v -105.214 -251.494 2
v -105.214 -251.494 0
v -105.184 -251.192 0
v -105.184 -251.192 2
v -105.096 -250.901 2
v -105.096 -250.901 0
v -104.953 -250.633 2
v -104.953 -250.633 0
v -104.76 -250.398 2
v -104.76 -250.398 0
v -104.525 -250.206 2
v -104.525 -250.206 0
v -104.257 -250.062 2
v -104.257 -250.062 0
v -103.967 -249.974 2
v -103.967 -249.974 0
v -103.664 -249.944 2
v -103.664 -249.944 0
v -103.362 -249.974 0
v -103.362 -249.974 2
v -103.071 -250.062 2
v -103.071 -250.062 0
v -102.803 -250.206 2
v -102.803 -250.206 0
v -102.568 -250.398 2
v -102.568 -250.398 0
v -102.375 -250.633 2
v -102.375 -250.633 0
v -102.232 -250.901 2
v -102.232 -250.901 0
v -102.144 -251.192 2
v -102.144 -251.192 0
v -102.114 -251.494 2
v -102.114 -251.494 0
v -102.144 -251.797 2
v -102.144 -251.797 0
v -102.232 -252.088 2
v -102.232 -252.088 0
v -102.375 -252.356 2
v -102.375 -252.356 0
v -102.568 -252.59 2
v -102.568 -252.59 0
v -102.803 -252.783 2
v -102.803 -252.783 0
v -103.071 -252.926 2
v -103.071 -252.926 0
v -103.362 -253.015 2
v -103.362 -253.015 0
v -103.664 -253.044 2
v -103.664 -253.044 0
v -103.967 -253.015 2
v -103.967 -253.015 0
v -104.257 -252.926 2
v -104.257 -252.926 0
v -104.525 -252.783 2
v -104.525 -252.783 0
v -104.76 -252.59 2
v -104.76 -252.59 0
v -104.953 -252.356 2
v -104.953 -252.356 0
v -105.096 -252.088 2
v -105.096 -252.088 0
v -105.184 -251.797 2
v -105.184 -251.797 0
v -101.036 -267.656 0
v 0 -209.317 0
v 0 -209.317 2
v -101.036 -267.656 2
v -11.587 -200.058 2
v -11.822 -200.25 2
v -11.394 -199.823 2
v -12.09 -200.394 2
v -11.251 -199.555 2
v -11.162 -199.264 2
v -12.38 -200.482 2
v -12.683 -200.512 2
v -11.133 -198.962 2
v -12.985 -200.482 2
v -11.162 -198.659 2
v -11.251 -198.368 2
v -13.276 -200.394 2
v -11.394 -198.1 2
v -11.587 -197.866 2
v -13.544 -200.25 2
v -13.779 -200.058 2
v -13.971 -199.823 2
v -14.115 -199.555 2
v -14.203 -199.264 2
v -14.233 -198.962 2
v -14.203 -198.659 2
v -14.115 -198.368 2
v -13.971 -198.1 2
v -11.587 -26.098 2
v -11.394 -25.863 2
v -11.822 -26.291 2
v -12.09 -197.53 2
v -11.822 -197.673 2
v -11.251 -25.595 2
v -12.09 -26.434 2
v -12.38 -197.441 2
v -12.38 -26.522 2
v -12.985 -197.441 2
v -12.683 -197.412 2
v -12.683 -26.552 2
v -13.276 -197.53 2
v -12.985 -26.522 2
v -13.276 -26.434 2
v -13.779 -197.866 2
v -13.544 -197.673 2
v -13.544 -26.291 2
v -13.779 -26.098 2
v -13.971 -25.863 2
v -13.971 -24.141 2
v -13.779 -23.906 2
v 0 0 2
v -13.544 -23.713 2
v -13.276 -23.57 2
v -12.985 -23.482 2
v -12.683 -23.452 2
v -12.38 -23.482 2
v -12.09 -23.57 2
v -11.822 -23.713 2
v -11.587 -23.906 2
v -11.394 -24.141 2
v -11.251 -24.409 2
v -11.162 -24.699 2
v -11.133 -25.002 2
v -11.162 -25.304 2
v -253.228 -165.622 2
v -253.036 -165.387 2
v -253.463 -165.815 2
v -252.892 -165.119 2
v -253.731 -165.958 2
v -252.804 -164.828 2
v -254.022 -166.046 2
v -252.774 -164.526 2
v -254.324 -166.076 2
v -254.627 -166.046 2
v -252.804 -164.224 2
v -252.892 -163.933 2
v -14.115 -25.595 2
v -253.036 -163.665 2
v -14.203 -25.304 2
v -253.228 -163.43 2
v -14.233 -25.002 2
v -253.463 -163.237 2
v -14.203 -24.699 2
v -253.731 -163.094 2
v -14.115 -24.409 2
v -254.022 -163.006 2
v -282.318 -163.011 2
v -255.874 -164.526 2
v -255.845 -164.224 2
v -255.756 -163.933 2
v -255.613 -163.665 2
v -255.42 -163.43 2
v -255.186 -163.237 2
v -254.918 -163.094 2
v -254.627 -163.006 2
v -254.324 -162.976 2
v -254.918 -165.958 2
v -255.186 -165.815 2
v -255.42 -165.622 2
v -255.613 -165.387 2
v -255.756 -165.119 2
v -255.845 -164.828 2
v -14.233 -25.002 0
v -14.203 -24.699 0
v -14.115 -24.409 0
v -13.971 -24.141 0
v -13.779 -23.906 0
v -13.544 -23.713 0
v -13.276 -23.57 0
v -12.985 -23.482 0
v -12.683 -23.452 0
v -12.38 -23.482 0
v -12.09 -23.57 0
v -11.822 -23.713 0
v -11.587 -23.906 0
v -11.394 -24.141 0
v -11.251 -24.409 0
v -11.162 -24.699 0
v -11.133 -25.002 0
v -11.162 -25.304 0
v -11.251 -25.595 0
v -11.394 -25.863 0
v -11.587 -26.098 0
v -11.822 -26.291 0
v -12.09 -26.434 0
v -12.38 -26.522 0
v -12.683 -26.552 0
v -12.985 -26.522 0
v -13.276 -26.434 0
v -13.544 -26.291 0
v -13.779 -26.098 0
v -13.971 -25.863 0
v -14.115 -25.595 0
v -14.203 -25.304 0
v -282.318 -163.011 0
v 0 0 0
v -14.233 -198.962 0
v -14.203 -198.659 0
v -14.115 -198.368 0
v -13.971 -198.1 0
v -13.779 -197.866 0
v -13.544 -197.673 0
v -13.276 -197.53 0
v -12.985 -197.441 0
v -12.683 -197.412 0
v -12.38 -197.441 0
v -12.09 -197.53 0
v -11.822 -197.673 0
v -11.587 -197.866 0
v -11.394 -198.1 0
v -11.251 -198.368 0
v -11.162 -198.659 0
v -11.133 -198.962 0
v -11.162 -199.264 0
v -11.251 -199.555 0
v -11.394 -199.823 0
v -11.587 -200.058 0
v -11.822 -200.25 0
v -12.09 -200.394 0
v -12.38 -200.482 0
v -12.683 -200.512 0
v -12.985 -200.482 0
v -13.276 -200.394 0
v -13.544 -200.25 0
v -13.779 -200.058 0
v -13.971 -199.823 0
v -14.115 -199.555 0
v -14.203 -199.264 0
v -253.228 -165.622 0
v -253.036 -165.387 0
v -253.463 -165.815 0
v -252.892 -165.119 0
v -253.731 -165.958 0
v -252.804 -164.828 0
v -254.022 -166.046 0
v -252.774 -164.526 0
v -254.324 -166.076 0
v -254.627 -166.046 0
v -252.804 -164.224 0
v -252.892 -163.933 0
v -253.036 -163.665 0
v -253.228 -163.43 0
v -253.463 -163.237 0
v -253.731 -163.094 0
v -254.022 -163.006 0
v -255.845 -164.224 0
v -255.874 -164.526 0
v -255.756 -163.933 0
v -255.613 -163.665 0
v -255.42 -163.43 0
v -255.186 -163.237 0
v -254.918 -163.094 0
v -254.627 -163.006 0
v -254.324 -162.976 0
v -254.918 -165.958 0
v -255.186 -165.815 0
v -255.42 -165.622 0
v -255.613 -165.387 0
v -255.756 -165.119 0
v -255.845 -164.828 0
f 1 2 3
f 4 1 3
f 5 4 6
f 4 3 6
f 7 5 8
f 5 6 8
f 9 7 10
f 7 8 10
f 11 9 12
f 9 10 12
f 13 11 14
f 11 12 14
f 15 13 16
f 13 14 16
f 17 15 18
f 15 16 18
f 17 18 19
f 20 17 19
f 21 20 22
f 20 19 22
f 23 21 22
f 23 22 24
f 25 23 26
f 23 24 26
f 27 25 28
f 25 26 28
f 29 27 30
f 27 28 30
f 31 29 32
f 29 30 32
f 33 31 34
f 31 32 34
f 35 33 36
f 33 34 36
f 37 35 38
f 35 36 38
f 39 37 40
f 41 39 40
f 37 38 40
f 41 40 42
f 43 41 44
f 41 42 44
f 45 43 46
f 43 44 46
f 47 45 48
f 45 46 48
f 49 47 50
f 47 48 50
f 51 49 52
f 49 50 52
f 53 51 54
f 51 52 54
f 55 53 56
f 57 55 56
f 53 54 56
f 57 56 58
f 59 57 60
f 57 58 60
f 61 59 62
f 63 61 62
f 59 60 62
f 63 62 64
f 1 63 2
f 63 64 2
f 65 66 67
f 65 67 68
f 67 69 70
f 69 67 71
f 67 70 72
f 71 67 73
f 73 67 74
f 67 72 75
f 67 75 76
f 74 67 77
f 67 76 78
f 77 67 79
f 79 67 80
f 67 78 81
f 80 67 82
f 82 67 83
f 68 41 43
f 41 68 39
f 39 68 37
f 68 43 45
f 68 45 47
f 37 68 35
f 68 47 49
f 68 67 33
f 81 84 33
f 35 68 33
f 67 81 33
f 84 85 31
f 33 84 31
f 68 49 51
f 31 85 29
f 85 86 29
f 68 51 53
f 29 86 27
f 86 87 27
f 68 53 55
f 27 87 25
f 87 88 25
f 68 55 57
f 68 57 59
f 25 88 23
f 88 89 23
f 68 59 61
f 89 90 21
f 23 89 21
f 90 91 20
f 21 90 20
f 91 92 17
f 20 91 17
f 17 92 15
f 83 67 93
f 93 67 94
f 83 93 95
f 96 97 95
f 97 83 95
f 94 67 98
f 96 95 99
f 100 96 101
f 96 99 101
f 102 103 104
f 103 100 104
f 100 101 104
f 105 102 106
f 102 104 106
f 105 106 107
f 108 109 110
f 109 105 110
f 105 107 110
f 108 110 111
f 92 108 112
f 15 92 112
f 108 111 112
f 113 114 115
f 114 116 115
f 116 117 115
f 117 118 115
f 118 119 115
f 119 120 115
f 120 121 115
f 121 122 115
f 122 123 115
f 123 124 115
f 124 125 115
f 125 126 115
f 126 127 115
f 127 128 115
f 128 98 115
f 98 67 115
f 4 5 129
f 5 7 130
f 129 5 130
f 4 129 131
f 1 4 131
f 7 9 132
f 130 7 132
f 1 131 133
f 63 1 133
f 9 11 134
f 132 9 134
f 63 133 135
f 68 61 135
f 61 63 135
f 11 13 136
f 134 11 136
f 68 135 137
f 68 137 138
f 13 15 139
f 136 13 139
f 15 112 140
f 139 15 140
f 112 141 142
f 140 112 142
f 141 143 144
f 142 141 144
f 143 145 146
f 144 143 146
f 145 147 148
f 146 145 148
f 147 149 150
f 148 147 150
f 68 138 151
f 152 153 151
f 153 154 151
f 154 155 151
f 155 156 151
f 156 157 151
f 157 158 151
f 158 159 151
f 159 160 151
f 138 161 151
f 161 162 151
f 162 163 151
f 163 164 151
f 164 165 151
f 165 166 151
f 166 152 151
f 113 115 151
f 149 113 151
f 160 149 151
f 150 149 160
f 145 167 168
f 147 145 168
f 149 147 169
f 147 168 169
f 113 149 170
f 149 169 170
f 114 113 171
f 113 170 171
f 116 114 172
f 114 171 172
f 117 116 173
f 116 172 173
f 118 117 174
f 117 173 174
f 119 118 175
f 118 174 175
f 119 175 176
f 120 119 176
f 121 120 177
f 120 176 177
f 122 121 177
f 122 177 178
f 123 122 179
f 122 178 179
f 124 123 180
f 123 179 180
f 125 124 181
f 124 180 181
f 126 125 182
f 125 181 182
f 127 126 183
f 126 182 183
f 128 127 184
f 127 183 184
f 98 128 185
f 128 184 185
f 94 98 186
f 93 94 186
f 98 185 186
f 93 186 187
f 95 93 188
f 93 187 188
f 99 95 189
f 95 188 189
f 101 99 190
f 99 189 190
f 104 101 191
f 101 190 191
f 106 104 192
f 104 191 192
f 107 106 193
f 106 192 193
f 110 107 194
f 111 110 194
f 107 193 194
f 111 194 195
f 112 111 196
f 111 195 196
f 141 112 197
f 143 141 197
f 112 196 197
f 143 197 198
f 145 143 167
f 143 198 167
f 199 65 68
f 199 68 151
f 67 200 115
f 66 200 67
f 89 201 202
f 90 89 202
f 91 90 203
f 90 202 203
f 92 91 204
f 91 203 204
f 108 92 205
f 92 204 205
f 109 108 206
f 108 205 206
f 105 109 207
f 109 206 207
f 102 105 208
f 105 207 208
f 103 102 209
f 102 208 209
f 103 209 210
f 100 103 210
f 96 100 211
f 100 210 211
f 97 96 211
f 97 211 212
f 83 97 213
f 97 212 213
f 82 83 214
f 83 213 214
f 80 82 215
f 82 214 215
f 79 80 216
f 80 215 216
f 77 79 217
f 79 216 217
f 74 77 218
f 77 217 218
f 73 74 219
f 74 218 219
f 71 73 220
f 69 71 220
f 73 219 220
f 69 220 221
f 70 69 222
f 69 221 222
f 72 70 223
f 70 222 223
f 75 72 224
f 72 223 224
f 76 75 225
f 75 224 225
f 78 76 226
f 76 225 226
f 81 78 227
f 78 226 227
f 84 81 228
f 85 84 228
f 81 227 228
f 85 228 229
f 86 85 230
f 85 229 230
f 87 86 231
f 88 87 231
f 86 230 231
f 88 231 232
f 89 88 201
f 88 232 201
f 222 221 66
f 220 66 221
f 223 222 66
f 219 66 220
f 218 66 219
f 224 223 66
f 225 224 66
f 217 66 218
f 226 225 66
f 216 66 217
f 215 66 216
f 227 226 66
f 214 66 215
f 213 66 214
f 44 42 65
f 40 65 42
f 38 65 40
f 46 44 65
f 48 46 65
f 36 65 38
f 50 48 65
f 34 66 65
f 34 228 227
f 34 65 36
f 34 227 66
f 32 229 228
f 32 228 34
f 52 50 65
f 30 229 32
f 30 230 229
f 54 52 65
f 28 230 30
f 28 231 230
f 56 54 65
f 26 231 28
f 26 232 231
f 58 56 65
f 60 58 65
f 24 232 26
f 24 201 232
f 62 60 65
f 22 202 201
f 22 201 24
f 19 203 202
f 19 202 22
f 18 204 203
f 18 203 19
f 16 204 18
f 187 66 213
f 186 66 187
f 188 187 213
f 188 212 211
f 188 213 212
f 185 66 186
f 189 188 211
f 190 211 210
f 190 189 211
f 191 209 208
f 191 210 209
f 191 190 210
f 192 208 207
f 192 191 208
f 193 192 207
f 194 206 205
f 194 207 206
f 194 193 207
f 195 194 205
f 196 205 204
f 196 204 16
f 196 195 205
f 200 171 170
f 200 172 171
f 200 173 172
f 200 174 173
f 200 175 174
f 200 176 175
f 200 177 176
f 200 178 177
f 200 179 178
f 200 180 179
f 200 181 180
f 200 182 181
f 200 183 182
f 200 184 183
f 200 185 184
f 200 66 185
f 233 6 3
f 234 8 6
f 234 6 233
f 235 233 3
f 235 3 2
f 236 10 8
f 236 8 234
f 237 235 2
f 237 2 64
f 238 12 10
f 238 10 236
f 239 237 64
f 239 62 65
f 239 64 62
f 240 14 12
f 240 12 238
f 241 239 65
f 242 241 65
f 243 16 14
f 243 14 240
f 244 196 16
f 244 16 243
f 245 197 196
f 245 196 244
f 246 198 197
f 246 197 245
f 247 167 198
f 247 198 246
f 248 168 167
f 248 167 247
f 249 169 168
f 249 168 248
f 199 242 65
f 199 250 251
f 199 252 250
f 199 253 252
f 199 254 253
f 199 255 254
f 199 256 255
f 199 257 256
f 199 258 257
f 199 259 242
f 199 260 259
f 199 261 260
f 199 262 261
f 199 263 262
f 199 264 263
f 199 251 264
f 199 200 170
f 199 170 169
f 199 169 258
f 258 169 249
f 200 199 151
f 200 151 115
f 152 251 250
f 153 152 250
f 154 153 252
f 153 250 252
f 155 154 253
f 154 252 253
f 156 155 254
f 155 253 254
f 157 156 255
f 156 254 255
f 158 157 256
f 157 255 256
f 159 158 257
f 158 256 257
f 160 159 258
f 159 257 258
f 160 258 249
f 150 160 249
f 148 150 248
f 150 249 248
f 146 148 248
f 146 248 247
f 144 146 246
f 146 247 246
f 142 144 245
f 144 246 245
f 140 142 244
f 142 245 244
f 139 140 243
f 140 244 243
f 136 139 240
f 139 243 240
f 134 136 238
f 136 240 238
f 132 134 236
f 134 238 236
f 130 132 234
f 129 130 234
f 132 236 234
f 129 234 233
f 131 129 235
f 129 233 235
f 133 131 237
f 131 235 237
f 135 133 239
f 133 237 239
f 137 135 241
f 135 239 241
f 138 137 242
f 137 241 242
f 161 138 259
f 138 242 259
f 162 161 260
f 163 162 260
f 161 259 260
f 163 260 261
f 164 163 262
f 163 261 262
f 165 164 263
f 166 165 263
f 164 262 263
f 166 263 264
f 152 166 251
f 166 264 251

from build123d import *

# Parameters (mm, degrees)
EXTRUDE_1_DEPTH     = 2
SKETCH_4_R          = 1.55
CUT_EXTRUDE_1_DEPTH = 2


with BuildPart() as part:
    # Эскиз3 → Бобышка-Вытянуть1 (new body)
    with BuildSketch(Plane.XY):
        Polygon((0, -209.31740407), (-101.035924752, -267.65564884), (-282.318078778, -163.01074319), (0, 0), align=None)
    extrude(amount=EXTRUDE_1_DEPTH)

    # Эскиз4 → Вырез-Вытянуть1 (cut)
    with BuildSketch(Plane(origin=(0, 0, 0), x_dir=(-1, 0, 0), z_dir=(0, 0, -1))):
        with Locations((254.324370014, -164.525982342)):
            Circle(SKETCH_4_R)
        with Locations((103.664201466, -251.49438366)):
            Circle(SKETCH_4_R)
        with Locations((12.682716025, -198.961582281)):
            Circle(SKETCH_4_R)
        with Locations((12.682716025, -25.001847817)):
            Circle(SKETCH_4_R)
    extrude(amount=-CUT_EXTRUDE_1_DEPTH, mode=Mode.SUBTRACT)


solid = part.part
